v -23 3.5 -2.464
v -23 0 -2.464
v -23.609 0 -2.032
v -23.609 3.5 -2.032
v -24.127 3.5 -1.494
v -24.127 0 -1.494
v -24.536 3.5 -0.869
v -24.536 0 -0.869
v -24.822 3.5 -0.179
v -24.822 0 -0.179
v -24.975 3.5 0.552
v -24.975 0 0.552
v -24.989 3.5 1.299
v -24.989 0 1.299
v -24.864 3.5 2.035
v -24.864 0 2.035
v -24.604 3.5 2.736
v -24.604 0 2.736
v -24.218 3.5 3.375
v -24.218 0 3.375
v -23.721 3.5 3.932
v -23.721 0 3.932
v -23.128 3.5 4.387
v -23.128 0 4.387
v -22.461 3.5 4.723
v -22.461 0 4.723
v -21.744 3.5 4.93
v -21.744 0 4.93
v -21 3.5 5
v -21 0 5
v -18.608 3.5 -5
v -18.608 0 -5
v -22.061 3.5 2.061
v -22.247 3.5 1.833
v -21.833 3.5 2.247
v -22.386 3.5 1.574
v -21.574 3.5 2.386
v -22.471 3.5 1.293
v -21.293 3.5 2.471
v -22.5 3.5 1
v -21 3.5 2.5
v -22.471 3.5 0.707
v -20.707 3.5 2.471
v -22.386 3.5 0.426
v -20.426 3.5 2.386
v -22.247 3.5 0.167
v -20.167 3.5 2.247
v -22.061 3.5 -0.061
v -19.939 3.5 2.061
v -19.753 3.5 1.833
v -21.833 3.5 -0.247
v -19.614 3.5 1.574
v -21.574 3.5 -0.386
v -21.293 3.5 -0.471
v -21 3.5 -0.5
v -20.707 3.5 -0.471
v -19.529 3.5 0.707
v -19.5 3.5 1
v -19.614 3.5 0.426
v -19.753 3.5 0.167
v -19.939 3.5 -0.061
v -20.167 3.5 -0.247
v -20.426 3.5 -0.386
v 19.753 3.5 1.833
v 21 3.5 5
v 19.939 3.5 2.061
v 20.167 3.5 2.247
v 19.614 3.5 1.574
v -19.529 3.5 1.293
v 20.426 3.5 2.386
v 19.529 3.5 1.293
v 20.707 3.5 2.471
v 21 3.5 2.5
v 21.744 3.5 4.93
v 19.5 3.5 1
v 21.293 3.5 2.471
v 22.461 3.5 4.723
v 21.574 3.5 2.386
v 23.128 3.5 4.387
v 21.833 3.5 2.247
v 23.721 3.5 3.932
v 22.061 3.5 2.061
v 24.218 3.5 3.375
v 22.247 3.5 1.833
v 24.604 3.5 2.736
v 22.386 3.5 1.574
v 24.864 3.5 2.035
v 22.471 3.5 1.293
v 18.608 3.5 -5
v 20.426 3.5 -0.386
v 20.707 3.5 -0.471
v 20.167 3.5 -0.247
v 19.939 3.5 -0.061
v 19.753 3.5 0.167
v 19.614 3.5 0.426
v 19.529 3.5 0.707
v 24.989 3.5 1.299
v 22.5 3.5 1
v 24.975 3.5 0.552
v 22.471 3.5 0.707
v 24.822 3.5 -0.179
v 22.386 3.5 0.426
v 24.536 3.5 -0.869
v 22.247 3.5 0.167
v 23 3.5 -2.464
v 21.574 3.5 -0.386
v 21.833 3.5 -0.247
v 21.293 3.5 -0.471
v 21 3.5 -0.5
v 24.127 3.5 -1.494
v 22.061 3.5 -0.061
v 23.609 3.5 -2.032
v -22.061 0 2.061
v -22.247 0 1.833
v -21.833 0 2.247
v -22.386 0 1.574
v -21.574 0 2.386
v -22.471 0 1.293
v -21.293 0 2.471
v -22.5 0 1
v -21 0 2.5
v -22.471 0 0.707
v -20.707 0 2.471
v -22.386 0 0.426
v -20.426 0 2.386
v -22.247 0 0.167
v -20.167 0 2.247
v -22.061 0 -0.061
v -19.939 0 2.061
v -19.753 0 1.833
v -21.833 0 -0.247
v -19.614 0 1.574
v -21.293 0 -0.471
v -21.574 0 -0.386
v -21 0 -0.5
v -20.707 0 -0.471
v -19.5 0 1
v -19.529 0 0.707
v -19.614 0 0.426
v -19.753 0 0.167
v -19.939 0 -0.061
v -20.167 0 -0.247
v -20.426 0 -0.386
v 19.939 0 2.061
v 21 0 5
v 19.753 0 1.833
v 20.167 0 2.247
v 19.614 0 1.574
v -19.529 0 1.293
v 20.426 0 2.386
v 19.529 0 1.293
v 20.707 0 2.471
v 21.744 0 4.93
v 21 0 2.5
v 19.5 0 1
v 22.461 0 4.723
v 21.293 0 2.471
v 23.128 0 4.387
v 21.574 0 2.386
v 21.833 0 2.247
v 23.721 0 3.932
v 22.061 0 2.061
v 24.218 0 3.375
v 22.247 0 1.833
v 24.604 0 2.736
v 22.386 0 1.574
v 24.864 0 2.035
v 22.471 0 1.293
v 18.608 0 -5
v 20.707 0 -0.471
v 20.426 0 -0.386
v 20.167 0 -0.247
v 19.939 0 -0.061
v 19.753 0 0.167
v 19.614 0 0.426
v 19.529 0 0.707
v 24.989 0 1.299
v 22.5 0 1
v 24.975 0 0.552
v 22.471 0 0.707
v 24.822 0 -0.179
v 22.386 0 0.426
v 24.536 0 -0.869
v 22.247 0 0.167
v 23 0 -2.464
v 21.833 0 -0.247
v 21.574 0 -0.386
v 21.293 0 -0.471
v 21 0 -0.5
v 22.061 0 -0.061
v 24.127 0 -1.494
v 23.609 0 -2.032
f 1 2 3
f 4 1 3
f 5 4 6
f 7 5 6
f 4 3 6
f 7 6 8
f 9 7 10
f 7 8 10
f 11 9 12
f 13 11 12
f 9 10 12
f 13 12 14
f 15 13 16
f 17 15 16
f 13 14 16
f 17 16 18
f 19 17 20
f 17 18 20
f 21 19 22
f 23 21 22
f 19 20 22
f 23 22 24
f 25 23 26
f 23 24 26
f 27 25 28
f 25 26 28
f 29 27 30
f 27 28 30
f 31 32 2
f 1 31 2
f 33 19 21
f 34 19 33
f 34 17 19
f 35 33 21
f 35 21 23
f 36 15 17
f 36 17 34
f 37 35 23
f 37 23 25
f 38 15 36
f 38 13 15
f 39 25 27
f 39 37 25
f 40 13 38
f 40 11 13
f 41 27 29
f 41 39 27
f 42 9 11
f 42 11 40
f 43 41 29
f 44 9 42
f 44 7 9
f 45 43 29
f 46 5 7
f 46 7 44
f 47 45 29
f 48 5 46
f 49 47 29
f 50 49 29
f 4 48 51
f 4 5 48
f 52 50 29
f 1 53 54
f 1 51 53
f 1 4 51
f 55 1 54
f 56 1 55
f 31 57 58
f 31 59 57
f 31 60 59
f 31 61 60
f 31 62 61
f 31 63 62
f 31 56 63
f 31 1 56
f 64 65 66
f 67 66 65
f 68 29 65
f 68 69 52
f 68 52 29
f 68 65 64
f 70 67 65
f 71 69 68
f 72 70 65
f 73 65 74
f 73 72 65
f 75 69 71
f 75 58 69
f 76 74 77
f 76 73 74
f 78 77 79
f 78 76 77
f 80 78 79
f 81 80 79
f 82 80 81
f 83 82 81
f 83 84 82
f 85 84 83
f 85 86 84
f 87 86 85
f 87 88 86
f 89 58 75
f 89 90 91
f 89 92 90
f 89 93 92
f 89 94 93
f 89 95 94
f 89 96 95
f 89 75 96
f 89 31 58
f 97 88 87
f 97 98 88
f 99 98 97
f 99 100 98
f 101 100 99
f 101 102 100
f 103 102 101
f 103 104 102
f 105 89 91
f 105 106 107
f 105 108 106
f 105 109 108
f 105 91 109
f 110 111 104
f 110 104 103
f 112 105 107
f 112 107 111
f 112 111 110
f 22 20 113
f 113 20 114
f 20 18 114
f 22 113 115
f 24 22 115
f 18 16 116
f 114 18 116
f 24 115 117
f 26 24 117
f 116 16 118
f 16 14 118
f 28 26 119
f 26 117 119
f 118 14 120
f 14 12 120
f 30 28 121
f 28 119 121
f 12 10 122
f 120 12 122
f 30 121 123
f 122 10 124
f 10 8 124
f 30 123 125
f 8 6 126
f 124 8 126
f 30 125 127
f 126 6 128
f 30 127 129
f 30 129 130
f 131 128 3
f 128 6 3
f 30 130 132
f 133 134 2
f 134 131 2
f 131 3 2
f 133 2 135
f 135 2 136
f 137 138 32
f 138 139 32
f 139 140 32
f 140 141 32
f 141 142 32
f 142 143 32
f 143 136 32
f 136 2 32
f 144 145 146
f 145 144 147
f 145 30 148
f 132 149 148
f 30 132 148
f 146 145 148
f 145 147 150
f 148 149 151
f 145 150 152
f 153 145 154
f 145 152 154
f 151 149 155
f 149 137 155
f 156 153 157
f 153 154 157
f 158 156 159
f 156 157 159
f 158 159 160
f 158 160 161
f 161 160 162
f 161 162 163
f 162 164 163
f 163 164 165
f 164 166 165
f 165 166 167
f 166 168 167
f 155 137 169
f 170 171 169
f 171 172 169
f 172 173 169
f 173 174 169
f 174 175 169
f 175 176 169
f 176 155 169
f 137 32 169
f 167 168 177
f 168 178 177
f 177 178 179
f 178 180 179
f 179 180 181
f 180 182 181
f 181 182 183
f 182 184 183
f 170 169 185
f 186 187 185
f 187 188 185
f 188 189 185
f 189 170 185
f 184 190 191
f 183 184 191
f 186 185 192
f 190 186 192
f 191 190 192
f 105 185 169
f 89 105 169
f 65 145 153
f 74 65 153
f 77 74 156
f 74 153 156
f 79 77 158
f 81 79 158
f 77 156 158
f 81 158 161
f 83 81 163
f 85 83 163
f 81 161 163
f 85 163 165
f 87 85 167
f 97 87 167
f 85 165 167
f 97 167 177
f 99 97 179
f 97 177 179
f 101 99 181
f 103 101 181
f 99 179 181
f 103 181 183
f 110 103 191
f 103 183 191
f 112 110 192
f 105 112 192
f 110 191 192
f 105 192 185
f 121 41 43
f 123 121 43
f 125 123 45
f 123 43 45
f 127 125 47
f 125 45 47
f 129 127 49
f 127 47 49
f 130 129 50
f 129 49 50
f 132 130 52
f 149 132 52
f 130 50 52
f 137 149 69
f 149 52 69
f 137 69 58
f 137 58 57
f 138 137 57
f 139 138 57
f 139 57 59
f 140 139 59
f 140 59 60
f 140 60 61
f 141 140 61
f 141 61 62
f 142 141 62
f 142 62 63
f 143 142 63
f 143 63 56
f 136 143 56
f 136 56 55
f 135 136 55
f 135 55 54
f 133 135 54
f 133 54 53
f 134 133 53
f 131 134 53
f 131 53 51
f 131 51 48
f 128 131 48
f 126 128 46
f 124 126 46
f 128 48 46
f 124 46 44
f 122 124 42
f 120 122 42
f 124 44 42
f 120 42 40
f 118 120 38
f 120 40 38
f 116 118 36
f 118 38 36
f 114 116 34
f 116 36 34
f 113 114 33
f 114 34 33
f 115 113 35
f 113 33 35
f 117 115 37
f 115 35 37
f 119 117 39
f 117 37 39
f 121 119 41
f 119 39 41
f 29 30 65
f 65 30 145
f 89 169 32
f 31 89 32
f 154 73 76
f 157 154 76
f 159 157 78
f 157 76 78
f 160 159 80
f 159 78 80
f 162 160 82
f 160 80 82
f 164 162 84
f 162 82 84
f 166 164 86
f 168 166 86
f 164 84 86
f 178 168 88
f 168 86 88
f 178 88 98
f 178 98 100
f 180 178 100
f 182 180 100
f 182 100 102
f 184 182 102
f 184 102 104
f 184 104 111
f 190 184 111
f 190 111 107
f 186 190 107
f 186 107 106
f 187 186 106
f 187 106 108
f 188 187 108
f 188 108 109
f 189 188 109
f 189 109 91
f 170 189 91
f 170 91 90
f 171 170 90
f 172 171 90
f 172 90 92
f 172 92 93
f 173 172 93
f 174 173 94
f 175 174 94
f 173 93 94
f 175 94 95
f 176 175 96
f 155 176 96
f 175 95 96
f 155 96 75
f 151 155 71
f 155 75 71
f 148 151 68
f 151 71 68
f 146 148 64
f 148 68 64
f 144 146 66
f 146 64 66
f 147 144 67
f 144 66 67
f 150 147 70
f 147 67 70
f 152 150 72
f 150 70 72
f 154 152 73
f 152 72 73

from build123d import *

# Parameters (mm, degrees)
BOSS_EXTRUDE1_DEPTH = 3.5
SKETCH2_R           = 1.5
CUT_EXTRUDE1_DEPTH  = 26.734218465


with BuildPart() as part:
    # Sketch1 → Boss-Extrude1 (new body)
    with BuildSketch(Plane(origin=(0, 0, 0), x_dir=(1, 0, 0), z_dir=(0, 1, 0))):
        with BuildLine():
            Line((-18.607695155, -5), (18.607695155, -5))
            Line((18.607695155, -5), (21, -5))
            ThreePointArc((21, -5), (24.863703305, -2.03527618), (23, 2.464101615))
            Line((23, 2.464101615), (18.607695155, 5))
            Line((18.607695155, 5), (-18.607695155, 5))
            Line((-18.607695155, 5), (-23, 2.464101615))
            ThreePointArc((-23, 2.464101615), (-24.863703305, -2.03527618), (-21, -5))
            Line((-21, -5), (-18.607695155, -5))
        make_face()
    extrude(amount=BOSS_EXTRUDE1_DEPTH)

    # Sketch2 → Cut-Extrude1 (cut, through all)
    with BuildSketch(Plane(origin=(0, 3.5, 0), x_dir=(1, 0, 0), z_dir=(0, 1, 0))):
        with Locations(Location((-21, -1, 0), (0, 0, 270))):
            Circle(SKETCH2_R)
        with Locations(Location((21, -1, 0), (0, 0, 270))):
            Circle(SKETCH2_R)
    extrude(amount=-CUT_EXTRUDE1_DEPTH, mode=Mode.SUBTRACT)


solid = part.part
